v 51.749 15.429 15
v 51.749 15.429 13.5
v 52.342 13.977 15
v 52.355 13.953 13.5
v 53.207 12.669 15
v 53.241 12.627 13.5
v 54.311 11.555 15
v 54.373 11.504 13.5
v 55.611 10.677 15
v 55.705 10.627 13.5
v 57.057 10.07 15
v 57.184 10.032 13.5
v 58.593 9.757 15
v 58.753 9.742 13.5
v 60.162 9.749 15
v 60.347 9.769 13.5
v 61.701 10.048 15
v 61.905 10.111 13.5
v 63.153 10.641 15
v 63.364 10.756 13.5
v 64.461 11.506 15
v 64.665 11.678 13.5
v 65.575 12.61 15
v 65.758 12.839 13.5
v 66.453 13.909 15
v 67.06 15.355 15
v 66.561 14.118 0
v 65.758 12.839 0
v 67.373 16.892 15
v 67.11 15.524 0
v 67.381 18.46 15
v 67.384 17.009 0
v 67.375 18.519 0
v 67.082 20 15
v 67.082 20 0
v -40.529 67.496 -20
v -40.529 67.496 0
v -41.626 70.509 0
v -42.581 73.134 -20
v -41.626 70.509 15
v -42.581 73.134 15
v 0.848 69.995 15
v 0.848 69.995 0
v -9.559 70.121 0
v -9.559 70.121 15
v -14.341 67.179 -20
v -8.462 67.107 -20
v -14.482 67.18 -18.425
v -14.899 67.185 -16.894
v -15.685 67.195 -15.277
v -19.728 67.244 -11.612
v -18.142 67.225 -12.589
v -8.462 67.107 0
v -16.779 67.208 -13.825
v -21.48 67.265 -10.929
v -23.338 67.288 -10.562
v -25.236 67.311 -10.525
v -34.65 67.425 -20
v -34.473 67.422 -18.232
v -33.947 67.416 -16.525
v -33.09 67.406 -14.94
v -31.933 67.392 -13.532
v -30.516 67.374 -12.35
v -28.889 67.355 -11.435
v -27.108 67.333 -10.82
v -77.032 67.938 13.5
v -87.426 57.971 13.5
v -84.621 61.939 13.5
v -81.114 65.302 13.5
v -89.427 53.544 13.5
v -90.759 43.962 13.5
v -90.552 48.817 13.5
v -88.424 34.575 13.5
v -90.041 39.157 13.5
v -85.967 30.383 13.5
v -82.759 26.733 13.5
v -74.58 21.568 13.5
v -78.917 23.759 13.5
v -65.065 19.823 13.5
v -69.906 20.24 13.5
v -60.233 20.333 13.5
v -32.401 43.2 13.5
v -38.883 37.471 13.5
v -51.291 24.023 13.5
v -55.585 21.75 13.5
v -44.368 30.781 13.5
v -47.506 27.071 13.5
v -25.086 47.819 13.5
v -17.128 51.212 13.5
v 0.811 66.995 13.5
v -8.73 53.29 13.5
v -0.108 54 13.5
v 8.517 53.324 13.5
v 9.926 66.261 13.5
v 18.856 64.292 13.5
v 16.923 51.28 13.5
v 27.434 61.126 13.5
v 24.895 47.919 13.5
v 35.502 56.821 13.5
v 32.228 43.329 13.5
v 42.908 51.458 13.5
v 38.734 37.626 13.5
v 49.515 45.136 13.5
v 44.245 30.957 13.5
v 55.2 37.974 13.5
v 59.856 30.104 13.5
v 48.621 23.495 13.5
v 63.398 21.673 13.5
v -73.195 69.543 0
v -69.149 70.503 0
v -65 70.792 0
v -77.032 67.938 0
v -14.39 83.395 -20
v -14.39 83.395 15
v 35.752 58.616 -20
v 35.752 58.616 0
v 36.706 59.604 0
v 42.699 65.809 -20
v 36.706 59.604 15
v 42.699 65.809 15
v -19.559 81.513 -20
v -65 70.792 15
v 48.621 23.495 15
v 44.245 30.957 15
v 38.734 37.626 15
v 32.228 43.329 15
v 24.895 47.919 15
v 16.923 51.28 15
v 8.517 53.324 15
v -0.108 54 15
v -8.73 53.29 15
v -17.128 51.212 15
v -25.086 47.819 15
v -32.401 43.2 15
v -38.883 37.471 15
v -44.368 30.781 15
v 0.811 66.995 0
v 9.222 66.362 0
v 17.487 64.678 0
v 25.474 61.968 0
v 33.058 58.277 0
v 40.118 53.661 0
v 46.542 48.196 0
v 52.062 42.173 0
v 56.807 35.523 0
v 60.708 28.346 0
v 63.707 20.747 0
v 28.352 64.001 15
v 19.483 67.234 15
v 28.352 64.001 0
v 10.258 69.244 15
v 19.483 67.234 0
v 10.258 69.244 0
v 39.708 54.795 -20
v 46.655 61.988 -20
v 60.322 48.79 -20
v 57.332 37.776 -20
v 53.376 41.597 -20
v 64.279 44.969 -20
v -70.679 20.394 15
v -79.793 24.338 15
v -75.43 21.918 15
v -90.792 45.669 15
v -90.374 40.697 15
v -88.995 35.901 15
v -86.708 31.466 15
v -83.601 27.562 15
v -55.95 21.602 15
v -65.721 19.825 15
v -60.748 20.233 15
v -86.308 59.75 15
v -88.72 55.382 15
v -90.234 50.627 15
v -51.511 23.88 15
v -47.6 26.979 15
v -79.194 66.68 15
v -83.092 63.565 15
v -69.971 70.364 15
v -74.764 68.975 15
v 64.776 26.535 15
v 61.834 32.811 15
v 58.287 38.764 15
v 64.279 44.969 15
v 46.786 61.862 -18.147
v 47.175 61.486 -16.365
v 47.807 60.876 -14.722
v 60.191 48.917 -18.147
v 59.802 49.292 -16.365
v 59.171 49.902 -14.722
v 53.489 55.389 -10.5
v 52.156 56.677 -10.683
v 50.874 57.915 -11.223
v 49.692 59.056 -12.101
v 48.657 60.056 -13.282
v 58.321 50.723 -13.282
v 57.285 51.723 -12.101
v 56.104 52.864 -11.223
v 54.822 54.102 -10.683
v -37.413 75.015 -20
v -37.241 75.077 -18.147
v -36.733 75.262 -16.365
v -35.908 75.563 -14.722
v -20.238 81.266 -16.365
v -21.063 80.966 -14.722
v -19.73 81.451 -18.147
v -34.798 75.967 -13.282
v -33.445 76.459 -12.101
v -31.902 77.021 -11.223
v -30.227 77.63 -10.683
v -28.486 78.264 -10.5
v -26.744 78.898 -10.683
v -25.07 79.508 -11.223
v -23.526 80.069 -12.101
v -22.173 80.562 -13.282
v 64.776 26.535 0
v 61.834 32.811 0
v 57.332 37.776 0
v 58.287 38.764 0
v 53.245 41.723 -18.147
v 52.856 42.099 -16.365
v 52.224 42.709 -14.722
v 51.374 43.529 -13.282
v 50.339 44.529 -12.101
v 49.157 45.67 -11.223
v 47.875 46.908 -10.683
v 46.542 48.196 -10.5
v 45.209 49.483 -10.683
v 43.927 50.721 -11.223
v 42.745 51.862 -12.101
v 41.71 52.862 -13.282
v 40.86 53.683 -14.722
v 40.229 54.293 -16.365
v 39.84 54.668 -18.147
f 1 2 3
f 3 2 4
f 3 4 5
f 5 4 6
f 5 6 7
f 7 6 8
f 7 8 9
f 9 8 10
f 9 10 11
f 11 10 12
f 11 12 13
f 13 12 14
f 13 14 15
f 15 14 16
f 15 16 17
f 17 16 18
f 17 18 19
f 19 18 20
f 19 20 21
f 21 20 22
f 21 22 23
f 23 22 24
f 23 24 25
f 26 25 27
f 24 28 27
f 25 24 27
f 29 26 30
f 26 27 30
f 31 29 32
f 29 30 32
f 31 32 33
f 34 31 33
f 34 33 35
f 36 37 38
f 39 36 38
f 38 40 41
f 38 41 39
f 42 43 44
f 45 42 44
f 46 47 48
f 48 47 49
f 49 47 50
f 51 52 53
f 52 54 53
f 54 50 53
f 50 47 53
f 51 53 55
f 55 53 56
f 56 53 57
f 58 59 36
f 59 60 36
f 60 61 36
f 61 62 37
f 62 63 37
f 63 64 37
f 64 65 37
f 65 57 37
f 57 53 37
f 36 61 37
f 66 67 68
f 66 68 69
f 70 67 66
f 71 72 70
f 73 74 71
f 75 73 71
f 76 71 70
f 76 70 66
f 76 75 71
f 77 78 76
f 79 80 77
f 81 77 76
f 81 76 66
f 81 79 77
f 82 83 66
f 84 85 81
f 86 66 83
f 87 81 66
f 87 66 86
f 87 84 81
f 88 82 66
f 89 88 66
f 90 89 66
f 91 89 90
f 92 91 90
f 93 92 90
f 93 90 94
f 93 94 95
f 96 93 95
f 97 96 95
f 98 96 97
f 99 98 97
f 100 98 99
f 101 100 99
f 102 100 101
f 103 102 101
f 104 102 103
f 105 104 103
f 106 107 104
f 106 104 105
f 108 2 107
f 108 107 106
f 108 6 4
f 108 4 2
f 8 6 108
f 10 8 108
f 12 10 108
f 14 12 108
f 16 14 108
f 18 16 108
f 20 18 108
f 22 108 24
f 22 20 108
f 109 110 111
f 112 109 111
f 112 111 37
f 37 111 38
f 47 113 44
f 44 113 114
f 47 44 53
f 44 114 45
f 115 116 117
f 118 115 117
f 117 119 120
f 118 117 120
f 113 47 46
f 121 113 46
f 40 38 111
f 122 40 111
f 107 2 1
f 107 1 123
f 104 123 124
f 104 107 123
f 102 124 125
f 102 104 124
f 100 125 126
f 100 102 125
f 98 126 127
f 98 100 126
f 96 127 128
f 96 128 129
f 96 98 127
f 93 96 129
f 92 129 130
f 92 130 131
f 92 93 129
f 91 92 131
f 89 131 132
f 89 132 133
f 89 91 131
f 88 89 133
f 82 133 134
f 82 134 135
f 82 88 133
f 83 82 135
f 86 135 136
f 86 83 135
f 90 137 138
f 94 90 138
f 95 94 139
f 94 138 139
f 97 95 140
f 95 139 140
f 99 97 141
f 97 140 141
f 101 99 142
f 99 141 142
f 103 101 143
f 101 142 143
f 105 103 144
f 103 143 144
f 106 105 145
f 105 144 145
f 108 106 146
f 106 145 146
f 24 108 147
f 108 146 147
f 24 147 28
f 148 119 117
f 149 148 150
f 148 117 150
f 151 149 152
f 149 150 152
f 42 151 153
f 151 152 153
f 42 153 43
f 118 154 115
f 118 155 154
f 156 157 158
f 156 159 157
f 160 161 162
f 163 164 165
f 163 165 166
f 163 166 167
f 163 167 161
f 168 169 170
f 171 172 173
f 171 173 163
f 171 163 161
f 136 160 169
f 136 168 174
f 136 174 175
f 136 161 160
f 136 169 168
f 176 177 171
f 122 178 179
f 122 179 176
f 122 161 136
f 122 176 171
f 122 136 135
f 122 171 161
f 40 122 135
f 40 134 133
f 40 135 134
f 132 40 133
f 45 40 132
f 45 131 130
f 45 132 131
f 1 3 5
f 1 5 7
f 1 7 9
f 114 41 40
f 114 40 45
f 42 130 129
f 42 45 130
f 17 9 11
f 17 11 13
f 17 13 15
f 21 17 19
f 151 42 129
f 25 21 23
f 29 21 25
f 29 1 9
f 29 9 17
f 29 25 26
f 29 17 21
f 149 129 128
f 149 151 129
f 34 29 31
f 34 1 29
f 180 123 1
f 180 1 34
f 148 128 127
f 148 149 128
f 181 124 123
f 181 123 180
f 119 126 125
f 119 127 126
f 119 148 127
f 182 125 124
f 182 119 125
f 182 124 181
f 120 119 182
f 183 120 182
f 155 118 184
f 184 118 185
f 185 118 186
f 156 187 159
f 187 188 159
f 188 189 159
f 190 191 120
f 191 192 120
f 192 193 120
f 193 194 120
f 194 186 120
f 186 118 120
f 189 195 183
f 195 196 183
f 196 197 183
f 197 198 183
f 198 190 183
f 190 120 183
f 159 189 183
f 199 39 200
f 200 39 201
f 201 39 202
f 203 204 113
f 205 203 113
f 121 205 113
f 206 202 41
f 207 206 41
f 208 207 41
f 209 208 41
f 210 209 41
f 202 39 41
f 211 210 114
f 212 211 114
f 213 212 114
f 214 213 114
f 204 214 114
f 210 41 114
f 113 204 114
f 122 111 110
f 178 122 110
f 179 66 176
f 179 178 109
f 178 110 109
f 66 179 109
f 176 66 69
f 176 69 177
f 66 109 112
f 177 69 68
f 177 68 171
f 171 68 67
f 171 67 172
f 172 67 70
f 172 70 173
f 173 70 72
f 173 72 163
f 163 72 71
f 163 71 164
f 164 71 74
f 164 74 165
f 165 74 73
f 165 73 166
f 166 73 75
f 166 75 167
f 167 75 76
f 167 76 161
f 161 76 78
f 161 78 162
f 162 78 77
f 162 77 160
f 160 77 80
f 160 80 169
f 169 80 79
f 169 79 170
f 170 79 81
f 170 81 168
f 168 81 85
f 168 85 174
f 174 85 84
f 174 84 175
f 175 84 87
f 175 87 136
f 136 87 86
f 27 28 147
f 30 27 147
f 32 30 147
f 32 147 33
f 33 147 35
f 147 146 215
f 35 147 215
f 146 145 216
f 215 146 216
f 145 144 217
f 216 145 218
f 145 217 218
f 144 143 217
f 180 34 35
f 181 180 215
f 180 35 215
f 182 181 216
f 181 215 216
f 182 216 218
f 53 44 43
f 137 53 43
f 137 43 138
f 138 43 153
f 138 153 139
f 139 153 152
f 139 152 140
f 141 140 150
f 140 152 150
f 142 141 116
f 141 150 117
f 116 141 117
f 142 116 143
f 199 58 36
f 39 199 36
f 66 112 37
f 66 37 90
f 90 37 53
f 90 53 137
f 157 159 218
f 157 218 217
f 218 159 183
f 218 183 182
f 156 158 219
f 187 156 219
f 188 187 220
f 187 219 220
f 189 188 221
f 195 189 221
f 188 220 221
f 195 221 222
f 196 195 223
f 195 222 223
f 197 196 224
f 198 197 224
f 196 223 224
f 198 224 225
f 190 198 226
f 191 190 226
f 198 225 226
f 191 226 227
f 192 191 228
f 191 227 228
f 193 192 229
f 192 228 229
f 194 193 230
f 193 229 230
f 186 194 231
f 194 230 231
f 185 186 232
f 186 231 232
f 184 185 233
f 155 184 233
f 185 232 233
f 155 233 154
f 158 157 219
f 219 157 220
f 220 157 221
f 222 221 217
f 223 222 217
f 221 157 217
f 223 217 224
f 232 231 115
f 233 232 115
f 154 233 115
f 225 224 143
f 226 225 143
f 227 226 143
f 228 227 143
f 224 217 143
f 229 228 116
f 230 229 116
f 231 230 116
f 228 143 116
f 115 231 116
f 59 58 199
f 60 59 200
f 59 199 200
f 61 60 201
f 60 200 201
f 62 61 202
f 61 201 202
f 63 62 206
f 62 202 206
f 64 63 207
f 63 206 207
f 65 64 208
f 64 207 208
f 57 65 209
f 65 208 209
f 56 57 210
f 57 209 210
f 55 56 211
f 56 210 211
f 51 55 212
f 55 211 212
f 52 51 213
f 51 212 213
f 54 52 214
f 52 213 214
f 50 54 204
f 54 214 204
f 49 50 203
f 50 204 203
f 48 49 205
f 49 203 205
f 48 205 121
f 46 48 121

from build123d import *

# Parameters (mm, degrees)
PAD_DEPTH       = 15
SKETCH002_R     = 67
POCKET_DEPTH    = 13.5
POCKET001_DEPTH = 13.5
PAD001_DEPTH    = 35
PAD002_DEPTH    = 35
SKETCH_R        = 9.5
POCKET002_DEPTH = 39.8207539141
SKETCH007_R     = 9.5
POCKET003_DEPTH = 97.217065943


with BuildPart() as part:
    # Sketch001 → Pad (new body)
    with BuildSketch(Plane.XY):
        with BuildLine():
            ThreePointArc((67.082039325, 20), (42.1720802134, 55.8705257759), (0.8477088241, 69.9948668814))
            Line((0.8477088241, 69.9948668814), (-65, 70.7923477994))
            ThreePointArc((-65, 70.7923477994), (-87.9606343369, 33.6277973957), (-44.3683356165, 30.7806886639))
            ThreePointArc((51.7489964992, 15.4285890907), (8.5170581243, 53.324100751), (-44.3683356165, 30.7806886639))
            ThreePointArc((51.7489964992, 15.4285890907), (61.7012261231, 10.0477638873), (67.082039325, 20))
        make_face()
    extrude(amount=PAD_DEPTH)

    # Sketch002 → Pocket (cut)
    with BuildSketch(Plane(origin=(0, 0, 0), x_dir=(1, 0, 0), z_dir=(0, 0, -1))):
        Circle(SKETCH002_R)
    extrude(amount=-POCKET_DEPTH, mode=Mode.SUBTRACT)

    # Sketch003 → Pocket001 (cut)
    with BuildSketch(Plane(origin=(0, 0, 0), x_dir=(1, 0, 0), z_dir=(0, 0, -1))):
        Polygon((-152.5343617943, -68.8522555402), (0.8113925418, -66.9950867015), (-35.4631, 35.7409), align=None)
    extrude(amount=-POCKET001_DEPTH, mode=Mode.SUBTRACT)

    # Sketch005 → Pad001 (new body)
    with BuildSketch(Plane.XY.offset(15)):
        Polygon((35.7520138156, 58.6156421796), (42.6985975202, 65.809040183), (64.2787915304, 44.9692890692), (57.3322078258, 37.7758910658), align=None)
    extrude(amount=-PAD001_DEPTH)

    # Sketch006 → Pad002 (new body)
    with BuildSketch(Plane.XY.offset(15)):
        Polygon((-40.5291145864, 67.4957611541), (-42.5812354464, 73.1339168789), (-14.3904568228, 83.3945211786), (-8.4624301934, 67.1074018724), align=None)
    extrude(amount=-PAD002_DEPTH)

    # Sketch → Pocket002 (cut, through all)
    with BuildSketch(Plane(origin=(46.5421108207, 48.1957666227, 0), x_dir=(0.7193398003, -0.6946583705, 0), z_dir=(-0.6946583705, -0.7193398003, 0))):
        with Locations((0, -20)):
            Circle(SKETCH_R)
    extrude(amount=-POCKET002_DEPTH, mode=Mode.SUBTRACT)

    # Sketch007 → Pocket003 (cut, through all)
    with BuildSketch(Plane(origin=(-28.4858461346, 78.2642190287, 0), x_dir=(-0.9396926208, -0.3420201433, 0), z_dir=(-0.3420201433, 0.9396926208, 0))):
        with Locations((0, -20)):
            Circle(SKETCH007_R)
    extrude(amount=-POCKET003_DEPTH, mode=Mode.SUBTRACT)


solid = part.part
